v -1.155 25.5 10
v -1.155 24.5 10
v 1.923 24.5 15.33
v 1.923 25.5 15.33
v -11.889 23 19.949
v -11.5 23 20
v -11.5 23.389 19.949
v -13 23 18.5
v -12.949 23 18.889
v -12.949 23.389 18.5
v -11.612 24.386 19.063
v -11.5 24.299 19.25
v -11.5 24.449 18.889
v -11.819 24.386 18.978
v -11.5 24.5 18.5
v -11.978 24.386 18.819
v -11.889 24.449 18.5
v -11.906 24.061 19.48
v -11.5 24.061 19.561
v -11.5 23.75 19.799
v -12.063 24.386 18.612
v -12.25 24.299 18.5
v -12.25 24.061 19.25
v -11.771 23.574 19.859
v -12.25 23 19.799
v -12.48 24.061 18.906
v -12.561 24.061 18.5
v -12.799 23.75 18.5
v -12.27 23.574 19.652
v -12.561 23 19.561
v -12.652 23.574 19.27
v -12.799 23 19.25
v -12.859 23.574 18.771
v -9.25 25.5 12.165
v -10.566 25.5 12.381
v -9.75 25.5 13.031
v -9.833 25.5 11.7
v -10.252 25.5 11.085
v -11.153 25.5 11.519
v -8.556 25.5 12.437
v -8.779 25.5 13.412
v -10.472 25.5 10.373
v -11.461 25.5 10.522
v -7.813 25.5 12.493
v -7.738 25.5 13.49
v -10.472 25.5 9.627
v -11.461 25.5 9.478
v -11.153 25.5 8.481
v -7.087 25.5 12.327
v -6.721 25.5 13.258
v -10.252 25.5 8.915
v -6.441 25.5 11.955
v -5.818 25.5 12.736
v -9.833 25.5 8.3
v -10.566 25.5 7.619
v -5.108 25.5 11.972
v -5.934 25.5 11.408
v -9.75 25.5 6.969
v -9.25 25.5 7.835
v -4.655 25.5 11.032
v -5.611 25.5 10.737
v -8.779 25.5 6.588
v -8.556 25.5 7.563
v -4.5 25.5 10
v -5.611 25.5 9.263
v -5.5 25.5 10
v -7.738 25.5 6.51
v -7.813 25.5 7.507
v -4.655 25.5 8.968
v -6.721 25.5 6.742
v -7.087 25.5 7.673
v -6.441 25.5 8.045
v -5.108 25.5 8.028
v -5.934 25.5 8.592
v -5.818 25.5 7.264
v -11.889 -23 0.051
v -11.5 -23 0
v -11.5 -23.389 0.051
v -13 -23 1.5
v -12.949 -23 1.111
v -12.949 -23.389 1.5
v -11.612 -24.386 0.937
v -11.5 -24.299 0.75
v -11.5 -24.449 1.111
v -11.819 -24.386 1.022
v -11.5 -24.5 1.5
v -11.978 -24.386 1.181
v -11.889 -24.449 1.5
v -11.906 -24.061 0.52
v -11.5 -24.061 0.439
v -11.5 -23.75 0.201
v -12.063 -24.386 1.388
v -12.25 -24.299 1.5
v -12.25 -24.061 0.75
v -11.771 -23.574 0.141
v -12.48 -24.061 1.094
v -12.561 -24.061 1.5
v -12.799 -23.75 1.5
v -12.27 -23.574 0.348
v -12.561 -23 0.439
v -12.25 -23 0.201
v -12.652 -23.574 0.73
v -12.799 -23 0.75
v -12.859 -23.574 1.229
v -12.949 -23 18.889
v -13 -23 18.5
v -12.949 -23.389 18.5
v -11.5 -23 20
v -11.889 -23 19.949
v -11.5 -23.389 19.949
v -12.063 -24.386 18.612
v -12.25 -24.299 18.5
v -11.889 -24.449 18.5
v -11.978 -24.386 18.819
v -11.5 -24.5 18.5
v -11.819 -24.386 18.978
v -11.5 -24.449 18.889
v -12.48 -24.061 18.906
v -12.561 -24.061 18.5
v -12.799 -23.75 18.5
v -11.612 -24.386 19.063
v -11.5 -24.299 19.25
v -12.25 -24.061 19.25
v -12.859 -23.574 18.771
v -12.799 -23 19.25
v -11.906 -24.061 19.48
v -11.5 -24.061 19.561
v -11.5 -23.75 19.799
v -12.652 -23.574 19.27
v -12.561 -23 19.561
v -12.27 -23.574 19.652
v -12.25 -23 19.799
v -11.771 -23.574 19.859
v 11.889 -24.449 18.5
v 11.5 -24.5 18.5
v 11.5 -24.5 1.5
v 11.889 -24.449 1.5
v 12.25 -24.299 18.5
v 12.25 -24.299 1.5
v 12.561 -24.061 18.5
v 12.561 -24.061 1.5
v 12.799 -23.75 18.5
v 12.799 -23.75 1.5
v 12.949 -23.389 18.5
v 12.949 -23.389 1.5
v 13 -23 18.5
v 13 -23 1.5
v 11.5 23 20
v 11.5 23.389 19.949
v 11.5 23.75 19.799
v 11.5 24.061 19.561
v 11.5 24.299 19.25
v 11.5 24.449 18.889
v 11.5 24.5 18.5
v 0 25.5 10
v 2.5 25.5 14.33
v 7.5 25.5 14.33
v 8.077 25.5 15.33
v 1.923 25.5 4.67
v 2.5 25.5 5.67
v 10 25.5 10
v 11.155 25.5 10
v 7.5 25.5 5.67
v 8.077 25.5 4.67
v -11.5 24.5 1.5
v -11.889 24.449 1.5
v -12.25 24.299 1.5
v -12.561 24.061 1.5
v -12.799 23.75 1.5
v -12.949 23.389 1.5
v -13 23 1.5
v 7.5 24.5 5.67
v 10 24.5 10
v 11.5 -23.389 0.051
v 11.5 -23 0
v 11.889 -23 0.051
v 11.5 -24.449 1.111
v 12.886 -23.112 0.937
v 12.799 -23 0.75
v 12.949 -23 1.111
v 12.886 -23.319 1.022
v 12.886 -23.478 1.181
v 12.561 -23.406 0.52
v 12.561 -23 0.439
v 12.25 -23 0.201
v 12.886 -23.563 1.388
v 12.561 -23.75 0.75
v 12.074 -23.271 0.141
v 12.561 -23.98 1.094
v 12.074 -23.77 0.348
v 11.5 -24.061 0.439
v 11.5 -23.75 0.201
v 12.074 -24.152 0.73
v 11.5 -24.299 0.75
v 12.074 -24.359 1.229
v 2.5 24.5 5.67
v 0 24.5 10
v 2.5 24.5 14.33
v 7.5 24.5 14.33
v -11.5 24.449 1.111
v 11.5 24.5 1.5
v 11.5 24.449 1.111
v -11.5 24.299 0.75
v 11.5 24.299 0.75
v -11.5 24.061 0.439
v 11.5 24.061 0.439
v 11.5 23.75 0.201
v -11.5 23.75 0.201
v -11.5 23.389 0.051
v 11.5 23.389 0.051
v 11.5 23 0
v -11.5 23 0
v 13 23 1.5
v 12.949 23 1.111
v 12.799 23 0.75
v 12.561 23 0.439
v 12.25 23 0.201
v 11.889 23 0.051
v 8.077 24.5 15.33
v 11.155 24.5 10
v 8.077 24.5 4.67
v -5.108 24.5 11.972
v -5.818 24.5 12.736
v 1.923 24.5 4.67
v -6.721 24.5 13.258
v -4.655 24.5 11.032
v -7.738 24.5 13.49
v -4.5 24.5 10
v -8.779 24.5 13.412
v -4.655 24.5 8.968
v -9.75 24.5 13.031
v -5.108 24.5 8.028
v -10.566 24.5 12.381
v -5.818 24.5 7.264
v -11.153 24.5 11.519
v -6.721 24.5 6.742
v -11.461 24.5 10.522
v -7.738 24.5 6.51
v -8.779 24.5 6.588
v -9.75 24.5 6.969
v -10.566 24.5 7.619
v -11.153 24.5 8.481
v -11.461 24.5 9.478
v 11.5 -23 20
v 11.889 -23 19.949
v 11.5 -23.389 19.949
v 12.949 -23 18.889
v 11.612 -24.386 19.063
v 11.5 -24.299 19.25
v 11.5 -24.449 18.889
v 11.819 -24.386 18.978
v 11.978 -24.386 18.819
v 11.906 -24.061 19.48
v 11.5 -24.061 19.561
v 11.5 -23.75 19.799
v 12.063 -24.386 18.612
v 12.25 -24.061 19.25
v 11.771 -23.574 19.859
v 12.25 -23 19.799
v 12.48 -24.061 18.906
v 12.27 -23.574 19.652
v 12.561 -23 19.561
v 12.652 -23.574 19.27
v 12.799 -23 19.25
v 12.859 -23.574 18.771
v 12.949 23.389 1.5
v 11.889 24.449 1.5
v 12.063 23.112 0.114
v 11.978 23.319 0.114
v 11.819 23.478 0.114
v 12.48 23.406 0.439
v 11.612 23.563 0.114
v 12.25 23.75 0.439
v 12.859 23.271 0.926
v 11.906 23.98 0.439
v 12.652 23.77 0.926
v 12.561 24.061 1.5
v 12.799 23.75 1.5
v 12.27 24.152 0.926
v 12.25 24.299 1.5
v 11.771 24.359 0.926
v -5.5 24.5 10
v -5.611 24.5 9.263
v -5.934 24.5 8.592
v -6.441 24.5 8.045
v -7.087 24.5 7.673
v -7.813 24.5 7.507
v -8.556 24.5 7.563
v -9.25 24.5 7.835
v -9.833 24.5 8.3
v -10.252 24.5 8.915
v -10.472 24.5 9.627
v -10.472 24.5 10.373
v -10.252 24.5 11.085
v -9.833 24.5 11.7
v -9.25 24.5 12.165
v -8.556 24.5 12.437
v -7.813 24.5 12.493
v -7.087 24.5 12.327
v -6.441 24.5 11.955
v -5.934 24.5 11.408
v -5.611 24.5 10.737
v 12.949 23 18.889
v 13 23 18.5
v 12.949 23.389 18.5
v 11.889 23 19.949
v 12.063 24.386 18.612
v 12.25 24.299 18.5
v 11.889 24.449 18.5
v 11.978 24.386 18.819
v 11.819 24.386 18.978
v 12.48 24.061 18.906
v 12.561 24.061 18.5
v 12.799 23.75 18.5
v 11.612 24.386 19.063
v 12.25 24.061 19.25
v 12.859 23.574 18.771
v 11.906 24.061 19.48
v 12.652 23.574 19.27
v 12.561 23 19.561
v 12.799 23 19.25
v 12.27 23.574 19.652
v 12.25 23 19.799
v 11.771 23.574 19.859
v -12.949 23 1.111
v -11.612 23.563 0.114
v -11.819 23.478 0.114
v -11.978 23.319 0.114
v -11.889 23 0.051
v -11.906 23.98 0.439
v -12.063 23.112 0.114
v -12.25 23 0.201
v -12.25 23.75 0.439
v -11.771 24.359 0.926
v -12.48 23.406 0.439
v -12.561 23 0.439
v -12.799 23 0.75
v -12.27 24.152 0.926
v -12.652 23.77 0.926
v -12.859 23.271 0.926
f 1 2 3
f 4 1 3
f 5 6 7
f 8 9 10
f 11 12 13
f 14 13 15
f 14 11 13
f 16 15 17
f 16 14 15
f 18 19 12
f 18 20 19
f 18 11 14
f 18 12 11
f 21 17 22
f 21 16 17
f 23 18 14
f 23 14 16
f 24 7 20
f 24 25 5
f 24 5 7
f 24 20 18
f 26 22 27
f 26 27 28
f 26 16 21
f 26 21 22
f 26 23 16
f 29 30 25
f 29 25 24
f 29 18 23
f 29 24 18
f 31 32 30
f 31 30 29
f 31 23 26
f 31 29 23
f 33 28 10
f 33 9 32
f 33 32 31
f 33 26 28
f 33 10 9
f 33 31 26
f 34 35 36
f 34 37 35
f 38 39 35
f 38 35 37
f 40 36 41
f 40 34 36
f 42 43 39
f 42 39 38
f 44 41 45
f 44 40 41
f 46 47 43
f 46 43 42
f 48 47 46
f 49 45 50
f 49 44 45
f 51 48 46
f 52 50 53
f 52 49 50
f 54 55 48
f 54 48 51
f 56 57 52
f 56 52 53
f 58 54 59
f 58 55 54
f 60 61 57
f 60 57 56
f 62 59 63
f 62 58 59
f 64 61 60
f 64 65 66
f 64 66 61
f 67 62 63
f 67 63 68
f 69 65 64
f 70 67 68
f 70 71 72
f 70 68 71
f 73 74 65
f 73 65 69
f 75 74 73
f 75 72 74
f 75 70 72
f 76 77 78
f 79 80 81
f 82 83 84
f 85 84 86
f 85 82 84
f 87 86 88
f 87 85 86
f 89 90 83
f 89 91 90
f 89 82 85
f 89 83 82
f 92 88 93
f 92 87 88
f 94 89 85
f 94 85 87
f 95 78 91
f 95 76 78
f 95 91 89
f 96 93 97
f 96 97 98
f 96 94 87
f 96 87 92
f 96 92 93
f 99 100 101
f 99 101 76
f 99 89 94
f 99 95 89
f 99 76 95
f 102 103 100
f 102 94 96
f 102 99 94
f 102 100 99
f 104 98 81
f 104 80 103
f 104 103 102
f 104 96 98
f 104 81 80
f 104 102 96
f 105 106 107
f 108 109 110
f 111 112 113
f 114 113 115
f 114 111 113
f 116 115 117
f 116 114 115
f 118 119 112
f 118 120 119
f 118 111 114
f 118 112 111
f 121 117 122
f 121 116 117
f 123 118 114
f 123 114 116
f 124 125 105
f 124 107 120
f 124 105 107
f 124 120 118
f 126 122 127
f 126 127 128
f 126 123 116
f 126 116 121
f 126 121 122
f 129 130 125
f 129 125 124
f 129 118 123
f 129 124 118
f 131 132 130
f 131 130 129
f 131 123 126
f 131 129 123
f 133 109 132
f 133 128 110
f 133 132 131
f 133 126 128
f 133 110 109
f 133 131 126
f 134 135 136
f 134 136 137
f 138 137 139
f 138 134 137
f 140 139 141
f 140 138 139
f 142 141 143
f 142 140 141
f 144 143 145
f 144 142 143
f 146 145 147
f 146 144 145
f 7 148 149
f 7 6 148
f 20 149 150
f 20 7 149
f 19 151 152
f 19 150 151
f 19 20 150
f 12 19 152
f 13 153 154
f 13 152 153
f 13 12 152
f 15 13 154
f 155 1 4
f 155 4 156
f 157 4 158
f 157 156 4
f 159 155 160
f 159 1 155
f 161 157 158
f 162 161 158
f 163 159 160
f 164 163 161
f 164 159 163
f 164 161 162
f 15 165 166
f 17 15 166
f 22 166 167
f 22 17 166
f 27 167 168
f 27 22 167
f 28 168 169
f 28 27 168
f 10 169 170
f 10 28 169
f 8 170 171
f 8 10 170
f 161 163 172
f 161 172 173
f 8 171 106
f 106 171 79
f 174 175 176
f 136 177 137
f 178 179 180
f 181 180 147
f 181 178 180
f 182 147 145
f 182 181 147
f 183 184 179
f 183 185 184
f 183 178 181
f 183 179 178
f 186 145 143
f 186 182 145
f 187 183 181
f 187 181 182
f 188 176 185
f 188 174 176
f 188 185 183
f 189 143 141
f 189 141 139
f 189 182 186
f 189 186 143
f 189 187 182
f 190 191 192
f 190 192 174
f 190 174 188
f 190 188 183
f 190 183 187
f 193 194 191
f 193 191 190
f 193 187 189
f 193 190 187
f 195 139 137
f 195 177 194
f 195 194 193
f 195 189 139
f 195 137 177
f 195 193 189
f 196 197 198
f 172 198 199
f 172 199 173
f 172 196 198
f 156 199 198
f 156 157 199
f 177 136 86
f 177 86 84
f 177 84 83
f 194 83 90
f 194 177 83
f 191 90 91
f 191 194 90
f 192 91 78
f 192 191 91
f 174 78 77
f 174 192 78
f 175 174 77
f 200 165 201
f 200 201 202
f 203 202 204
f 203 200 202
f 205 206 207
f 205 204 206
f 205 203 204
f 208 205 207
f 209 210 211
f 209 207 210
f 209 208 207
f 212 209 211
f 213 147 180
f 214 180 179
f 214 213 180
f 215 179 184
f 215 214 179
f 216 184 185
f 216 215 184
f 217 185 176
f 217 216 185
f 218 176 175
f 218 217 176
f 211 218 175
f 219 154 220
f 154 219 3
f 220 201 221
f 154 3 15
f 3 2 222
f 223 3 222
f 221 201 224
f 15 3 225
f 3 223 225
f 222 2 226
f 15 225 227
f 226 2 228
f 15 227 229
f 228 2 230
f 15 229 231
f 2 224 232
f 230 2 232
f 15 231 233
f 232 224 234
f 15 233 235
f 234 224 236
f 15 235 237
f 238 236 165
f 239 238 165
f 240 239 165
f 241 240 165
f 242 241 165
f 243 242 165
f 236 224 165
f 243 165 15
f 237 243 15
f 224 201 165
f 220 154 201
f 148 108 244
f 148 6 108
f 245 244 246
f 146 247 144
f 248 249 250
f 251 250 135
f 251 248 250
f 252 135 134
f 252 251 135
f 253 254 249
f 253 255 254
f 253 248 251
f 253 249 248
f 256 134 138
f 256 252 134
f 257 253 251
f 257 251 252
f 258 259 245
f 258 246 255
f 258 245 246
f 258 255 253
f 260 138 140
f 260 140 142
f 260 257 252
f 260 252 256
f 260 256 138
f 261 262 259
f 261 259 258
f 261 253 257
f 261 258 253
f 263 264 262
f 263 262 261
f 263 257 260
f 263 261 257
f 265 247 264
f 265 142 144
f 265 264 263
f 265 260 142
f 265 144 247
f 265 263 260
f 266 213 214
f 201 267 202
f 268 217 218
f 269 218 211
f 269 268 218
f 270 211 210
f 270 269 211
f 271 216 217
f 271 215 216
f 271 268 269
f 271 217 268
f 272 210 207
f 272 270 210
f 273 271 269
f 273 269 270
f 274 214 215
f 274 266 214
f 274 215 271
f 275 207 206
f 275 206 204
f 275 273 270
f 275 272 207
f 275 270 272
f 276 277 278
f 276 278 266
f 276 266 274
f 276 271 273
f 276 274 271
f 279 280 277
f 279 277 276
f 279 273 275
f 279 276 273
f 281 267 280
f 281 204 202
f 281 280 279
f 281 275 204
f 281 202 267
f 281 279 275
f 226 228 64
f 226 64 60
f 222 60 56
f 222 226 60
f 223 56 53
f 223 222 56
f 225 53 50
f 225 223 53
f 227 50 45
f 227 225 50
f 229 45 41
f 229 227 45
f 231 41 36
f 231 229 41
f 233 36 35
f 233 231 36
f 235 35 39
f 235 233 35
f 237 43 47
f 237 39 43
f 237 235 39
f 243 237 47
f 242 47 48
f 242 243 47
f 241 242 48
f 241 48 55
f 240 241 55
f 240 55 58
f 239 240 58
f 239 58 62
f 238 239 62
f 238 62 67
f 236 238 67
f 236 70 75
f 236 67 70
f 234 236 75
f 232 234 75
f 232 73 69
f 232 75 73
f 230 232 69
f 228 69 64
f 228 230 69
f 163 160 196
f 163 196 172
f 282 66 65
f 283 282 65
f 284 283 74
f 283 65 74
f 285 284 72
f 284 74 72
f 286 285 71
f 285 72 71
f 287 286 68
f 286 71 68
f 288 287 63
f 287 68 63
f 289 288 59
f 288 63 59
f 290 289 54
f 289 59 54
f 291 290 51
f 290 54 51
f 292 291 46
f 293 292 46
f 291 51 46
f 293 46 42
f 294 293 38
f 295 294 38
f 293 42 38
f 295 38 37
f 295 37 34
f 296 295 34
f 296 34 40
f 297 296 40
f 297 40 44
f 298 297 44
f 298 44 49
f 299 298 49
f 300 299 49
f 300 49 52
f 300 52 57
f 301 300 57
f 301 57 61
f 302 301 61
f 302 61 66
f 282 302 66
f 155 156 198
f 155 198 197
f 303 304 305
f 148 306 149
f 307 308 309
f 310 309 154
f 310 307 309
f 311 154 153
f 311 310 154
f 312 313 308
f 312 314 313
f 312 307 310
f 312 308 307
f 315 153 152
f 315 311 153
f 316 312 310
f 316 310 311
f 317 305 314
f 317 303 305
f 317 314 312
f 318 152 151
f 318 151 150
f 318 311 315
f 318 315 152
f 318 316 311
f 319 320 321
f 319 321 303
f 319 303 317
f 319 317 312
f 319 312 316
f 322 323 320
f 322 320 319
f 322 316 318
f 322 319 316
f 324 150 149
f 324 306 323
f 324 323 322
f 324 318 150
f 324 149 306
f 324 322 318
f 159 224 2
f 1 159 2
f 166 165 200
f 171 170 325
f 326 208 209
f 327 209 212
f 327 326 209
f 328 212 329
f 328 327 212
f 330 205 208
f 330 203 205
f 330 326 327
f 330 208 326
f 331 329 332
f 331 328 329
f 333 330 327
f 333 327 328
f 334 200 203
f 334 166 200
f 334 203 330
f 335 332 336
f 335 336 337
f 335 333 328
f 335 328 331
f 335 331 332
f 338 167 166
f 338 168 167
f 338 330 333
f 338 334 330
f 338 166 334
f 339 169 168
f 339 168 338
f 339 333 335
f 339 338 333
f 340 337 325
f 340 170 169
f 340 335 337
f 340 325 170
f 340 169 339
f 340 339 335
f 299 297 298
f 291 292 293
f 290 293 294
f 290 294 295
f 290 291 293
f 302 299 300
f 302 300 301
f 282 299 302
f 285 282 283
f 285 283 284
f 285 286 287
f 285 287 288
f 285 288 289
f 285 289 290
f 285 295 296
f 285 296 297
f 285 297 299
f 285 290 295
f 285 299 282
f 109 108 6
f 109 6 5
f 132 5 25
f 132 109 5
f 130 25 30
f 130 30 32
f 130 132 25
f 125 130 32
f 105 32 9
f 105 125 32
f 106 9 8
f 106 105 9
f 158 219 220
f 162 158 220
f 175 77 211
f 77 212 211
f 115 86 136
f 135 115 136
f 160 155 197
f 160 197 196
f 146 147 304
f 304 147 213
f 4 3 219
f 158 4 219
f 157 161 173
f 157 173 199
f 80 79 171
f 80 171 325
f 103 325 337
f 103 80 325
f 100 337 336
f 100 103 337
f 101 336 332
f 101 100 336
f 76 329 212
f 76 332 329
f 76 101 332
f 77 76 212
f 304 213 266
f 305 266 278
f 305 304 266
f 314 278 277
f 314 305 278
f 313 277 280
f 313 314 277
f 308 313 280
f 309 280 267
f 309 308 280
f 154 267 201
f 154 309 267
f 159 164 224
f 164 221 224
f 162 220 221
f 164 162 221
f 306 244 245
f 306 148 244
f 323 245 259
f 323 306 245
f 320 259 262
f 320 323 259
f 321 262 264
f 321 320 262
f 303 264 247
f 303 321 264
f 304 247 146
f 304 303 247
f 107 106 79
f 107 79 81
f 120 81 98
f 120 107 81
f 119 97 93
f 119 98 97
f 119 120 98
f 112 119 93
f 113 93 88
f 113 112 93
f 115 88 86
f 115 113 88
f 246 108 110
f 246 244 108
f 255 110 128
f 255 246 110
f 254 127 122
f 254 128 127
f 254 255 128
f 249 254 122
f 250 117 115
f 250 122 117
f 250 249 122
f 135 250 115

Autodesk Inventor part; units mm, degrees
ref_plane "YZ Plane" through (0, 0, 0) normal (1, 0, 0) x (0, 1, 0)
ref_plane "XZ Plane" through (0, 0, 0) normal (0, 1, 0) x (-1, 0, 0)
ref_plane "XY Plane" through (0, 0, 0) normal (0, 0, 1) x (1, 0, 0)
sketch "Esboço1" plane through (0, 0, 0) normal (0, 0, 1) x (1, 0, 0)
  line L0 (-13, -24.5) -> (13, -24.5)
  line L1 (13, -24.5) -> (13, 24.5)
  line L2 (13, 24.5) -> (-13, 24.5)
  line L3 (-13, 24.5) -> (-13, -24.5)
  line L4 (-13, -24.5) -> (13, 24.5) construction
  line L5 (13, -24.5) -> (-13, 24.5) construction
  point P0 (0, 0)
  dimension "d0" = 49
  dimension "d1" = 26
extrude "Extrusão1" add sketch "Esboço1" along normal blind 20
sketch "Esboço2" plane through (-13, 24.5, 0) normal (0, 1, 0) x (1, 0, 0)
  circle A0 centre (5, -10) radius 2.5
  line L0 (26, 0) -> (0, 0) projected
  line L1 (0, 0) -> (0, -20) projected
  line L2 (26, -20) -> (0, -20) projected
  line L3 (26, 0) -> (26, -20) projected
  line L4 (20.5, -14.3301) -> (15.5, -14.3301)
  line L5 (15.5, -14.3301) -> (13, -10)
  line L6 (13, -10) -> (15.5, -5.6699)
  line L7 (15.5, -5.6699) -> (20.5, -5.6699)
  line L8 (20.5, -5.6699) -> (23, -10)
  line L9 (23, -10) -> (20.5, -14.3301)
  circle A1 centre (5, -10) radius 3.5
  line L10 (14.9226, -4.6699) -> (11.8453, -10)
  line L11 (11.8453, -10) -> (14.9226, -15.3301)
  line L12 (14.9226, -15.3301) -> (21.0774, -15.3301)
  line L13 (21.0774, -15.3301) -> (24.1547, -10)
  line L14 (24.1547, -10) -> (21.0774, -4.6699)
  line L15 (21.0774, -4.6699) -> (14.9226, -4.6699)
  point P0 (13, 0)
  point P1 (18, -10)
  dimension "d5" = 5
  dimension "d7" = 5
  dimension "d8" = 5
  dimension "d9" = 13
  dimension "d10" = 10
  dimension "d11" = 10
  dimension "d12" = 5
  dimension "d13" = 1
  dimension "d14" = 1
extrude "Extrusão2" add sketch "Esboço2" along normal blind 1 contours A0 | L4 L5 L6 L7 L8 L9 | A1 | L15 L14 L13 L12 L11 L10
extrude "Extrusão3" cut sketch "Esboço2" against normal blind 1 from surface at 1 contours A0 | L4 L5 L6 L7 L8 L9
fillet "Arredondamento1" radius 1.5 12 edges at (-13, 0, 20) (13, 0, 20) (0, 24.5, 20) (13, 24.5, 10) (-13, 24.5, 10) (0, 24.5, 0) (-13, 0, 0) (-13, -24.5, 10) (0, -24.5, 20) (0, -24.5, 0) (13, -24.5, 10) (13, 0, 0)
properties part number "bateria IC"
